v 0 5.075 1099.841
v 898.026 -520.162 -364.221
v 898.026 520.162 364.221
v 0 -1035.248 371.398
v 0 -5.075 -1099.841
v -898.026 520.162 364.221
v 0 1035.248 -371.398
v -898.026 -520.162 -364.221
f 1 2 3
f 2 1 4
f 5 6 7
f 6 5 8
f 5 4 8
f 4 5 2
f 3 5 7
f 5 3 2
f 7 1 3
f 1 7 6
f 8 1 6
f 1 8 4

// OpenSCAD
module everything(){
    rotate([35,0,0]) rotate([0,45,0]){
        color([1,.6,0]) cube([50,50,50], center=true);
        translate([-16, -16, 25]) {
            color([1,1,1]) text("D", font = "Liberation Sans:style=Bold", size=35);
        }
        rotate([0,-90,0]) translate([-16, -16, 25]) {
            color([1,1,1]) text("3", font = "Liberation Sans:style=Bold", size=35);
        }
        rotate([-90,-45,0]) translate([-27, -5, 25]) {
            color([1,1,1]) text("DOLLO", font = "Liberation Sans:style=Bold", size=12);
        }
    }
}

inches = 25.4;
scale([inches,inches,inches]) everything();

//everything();
